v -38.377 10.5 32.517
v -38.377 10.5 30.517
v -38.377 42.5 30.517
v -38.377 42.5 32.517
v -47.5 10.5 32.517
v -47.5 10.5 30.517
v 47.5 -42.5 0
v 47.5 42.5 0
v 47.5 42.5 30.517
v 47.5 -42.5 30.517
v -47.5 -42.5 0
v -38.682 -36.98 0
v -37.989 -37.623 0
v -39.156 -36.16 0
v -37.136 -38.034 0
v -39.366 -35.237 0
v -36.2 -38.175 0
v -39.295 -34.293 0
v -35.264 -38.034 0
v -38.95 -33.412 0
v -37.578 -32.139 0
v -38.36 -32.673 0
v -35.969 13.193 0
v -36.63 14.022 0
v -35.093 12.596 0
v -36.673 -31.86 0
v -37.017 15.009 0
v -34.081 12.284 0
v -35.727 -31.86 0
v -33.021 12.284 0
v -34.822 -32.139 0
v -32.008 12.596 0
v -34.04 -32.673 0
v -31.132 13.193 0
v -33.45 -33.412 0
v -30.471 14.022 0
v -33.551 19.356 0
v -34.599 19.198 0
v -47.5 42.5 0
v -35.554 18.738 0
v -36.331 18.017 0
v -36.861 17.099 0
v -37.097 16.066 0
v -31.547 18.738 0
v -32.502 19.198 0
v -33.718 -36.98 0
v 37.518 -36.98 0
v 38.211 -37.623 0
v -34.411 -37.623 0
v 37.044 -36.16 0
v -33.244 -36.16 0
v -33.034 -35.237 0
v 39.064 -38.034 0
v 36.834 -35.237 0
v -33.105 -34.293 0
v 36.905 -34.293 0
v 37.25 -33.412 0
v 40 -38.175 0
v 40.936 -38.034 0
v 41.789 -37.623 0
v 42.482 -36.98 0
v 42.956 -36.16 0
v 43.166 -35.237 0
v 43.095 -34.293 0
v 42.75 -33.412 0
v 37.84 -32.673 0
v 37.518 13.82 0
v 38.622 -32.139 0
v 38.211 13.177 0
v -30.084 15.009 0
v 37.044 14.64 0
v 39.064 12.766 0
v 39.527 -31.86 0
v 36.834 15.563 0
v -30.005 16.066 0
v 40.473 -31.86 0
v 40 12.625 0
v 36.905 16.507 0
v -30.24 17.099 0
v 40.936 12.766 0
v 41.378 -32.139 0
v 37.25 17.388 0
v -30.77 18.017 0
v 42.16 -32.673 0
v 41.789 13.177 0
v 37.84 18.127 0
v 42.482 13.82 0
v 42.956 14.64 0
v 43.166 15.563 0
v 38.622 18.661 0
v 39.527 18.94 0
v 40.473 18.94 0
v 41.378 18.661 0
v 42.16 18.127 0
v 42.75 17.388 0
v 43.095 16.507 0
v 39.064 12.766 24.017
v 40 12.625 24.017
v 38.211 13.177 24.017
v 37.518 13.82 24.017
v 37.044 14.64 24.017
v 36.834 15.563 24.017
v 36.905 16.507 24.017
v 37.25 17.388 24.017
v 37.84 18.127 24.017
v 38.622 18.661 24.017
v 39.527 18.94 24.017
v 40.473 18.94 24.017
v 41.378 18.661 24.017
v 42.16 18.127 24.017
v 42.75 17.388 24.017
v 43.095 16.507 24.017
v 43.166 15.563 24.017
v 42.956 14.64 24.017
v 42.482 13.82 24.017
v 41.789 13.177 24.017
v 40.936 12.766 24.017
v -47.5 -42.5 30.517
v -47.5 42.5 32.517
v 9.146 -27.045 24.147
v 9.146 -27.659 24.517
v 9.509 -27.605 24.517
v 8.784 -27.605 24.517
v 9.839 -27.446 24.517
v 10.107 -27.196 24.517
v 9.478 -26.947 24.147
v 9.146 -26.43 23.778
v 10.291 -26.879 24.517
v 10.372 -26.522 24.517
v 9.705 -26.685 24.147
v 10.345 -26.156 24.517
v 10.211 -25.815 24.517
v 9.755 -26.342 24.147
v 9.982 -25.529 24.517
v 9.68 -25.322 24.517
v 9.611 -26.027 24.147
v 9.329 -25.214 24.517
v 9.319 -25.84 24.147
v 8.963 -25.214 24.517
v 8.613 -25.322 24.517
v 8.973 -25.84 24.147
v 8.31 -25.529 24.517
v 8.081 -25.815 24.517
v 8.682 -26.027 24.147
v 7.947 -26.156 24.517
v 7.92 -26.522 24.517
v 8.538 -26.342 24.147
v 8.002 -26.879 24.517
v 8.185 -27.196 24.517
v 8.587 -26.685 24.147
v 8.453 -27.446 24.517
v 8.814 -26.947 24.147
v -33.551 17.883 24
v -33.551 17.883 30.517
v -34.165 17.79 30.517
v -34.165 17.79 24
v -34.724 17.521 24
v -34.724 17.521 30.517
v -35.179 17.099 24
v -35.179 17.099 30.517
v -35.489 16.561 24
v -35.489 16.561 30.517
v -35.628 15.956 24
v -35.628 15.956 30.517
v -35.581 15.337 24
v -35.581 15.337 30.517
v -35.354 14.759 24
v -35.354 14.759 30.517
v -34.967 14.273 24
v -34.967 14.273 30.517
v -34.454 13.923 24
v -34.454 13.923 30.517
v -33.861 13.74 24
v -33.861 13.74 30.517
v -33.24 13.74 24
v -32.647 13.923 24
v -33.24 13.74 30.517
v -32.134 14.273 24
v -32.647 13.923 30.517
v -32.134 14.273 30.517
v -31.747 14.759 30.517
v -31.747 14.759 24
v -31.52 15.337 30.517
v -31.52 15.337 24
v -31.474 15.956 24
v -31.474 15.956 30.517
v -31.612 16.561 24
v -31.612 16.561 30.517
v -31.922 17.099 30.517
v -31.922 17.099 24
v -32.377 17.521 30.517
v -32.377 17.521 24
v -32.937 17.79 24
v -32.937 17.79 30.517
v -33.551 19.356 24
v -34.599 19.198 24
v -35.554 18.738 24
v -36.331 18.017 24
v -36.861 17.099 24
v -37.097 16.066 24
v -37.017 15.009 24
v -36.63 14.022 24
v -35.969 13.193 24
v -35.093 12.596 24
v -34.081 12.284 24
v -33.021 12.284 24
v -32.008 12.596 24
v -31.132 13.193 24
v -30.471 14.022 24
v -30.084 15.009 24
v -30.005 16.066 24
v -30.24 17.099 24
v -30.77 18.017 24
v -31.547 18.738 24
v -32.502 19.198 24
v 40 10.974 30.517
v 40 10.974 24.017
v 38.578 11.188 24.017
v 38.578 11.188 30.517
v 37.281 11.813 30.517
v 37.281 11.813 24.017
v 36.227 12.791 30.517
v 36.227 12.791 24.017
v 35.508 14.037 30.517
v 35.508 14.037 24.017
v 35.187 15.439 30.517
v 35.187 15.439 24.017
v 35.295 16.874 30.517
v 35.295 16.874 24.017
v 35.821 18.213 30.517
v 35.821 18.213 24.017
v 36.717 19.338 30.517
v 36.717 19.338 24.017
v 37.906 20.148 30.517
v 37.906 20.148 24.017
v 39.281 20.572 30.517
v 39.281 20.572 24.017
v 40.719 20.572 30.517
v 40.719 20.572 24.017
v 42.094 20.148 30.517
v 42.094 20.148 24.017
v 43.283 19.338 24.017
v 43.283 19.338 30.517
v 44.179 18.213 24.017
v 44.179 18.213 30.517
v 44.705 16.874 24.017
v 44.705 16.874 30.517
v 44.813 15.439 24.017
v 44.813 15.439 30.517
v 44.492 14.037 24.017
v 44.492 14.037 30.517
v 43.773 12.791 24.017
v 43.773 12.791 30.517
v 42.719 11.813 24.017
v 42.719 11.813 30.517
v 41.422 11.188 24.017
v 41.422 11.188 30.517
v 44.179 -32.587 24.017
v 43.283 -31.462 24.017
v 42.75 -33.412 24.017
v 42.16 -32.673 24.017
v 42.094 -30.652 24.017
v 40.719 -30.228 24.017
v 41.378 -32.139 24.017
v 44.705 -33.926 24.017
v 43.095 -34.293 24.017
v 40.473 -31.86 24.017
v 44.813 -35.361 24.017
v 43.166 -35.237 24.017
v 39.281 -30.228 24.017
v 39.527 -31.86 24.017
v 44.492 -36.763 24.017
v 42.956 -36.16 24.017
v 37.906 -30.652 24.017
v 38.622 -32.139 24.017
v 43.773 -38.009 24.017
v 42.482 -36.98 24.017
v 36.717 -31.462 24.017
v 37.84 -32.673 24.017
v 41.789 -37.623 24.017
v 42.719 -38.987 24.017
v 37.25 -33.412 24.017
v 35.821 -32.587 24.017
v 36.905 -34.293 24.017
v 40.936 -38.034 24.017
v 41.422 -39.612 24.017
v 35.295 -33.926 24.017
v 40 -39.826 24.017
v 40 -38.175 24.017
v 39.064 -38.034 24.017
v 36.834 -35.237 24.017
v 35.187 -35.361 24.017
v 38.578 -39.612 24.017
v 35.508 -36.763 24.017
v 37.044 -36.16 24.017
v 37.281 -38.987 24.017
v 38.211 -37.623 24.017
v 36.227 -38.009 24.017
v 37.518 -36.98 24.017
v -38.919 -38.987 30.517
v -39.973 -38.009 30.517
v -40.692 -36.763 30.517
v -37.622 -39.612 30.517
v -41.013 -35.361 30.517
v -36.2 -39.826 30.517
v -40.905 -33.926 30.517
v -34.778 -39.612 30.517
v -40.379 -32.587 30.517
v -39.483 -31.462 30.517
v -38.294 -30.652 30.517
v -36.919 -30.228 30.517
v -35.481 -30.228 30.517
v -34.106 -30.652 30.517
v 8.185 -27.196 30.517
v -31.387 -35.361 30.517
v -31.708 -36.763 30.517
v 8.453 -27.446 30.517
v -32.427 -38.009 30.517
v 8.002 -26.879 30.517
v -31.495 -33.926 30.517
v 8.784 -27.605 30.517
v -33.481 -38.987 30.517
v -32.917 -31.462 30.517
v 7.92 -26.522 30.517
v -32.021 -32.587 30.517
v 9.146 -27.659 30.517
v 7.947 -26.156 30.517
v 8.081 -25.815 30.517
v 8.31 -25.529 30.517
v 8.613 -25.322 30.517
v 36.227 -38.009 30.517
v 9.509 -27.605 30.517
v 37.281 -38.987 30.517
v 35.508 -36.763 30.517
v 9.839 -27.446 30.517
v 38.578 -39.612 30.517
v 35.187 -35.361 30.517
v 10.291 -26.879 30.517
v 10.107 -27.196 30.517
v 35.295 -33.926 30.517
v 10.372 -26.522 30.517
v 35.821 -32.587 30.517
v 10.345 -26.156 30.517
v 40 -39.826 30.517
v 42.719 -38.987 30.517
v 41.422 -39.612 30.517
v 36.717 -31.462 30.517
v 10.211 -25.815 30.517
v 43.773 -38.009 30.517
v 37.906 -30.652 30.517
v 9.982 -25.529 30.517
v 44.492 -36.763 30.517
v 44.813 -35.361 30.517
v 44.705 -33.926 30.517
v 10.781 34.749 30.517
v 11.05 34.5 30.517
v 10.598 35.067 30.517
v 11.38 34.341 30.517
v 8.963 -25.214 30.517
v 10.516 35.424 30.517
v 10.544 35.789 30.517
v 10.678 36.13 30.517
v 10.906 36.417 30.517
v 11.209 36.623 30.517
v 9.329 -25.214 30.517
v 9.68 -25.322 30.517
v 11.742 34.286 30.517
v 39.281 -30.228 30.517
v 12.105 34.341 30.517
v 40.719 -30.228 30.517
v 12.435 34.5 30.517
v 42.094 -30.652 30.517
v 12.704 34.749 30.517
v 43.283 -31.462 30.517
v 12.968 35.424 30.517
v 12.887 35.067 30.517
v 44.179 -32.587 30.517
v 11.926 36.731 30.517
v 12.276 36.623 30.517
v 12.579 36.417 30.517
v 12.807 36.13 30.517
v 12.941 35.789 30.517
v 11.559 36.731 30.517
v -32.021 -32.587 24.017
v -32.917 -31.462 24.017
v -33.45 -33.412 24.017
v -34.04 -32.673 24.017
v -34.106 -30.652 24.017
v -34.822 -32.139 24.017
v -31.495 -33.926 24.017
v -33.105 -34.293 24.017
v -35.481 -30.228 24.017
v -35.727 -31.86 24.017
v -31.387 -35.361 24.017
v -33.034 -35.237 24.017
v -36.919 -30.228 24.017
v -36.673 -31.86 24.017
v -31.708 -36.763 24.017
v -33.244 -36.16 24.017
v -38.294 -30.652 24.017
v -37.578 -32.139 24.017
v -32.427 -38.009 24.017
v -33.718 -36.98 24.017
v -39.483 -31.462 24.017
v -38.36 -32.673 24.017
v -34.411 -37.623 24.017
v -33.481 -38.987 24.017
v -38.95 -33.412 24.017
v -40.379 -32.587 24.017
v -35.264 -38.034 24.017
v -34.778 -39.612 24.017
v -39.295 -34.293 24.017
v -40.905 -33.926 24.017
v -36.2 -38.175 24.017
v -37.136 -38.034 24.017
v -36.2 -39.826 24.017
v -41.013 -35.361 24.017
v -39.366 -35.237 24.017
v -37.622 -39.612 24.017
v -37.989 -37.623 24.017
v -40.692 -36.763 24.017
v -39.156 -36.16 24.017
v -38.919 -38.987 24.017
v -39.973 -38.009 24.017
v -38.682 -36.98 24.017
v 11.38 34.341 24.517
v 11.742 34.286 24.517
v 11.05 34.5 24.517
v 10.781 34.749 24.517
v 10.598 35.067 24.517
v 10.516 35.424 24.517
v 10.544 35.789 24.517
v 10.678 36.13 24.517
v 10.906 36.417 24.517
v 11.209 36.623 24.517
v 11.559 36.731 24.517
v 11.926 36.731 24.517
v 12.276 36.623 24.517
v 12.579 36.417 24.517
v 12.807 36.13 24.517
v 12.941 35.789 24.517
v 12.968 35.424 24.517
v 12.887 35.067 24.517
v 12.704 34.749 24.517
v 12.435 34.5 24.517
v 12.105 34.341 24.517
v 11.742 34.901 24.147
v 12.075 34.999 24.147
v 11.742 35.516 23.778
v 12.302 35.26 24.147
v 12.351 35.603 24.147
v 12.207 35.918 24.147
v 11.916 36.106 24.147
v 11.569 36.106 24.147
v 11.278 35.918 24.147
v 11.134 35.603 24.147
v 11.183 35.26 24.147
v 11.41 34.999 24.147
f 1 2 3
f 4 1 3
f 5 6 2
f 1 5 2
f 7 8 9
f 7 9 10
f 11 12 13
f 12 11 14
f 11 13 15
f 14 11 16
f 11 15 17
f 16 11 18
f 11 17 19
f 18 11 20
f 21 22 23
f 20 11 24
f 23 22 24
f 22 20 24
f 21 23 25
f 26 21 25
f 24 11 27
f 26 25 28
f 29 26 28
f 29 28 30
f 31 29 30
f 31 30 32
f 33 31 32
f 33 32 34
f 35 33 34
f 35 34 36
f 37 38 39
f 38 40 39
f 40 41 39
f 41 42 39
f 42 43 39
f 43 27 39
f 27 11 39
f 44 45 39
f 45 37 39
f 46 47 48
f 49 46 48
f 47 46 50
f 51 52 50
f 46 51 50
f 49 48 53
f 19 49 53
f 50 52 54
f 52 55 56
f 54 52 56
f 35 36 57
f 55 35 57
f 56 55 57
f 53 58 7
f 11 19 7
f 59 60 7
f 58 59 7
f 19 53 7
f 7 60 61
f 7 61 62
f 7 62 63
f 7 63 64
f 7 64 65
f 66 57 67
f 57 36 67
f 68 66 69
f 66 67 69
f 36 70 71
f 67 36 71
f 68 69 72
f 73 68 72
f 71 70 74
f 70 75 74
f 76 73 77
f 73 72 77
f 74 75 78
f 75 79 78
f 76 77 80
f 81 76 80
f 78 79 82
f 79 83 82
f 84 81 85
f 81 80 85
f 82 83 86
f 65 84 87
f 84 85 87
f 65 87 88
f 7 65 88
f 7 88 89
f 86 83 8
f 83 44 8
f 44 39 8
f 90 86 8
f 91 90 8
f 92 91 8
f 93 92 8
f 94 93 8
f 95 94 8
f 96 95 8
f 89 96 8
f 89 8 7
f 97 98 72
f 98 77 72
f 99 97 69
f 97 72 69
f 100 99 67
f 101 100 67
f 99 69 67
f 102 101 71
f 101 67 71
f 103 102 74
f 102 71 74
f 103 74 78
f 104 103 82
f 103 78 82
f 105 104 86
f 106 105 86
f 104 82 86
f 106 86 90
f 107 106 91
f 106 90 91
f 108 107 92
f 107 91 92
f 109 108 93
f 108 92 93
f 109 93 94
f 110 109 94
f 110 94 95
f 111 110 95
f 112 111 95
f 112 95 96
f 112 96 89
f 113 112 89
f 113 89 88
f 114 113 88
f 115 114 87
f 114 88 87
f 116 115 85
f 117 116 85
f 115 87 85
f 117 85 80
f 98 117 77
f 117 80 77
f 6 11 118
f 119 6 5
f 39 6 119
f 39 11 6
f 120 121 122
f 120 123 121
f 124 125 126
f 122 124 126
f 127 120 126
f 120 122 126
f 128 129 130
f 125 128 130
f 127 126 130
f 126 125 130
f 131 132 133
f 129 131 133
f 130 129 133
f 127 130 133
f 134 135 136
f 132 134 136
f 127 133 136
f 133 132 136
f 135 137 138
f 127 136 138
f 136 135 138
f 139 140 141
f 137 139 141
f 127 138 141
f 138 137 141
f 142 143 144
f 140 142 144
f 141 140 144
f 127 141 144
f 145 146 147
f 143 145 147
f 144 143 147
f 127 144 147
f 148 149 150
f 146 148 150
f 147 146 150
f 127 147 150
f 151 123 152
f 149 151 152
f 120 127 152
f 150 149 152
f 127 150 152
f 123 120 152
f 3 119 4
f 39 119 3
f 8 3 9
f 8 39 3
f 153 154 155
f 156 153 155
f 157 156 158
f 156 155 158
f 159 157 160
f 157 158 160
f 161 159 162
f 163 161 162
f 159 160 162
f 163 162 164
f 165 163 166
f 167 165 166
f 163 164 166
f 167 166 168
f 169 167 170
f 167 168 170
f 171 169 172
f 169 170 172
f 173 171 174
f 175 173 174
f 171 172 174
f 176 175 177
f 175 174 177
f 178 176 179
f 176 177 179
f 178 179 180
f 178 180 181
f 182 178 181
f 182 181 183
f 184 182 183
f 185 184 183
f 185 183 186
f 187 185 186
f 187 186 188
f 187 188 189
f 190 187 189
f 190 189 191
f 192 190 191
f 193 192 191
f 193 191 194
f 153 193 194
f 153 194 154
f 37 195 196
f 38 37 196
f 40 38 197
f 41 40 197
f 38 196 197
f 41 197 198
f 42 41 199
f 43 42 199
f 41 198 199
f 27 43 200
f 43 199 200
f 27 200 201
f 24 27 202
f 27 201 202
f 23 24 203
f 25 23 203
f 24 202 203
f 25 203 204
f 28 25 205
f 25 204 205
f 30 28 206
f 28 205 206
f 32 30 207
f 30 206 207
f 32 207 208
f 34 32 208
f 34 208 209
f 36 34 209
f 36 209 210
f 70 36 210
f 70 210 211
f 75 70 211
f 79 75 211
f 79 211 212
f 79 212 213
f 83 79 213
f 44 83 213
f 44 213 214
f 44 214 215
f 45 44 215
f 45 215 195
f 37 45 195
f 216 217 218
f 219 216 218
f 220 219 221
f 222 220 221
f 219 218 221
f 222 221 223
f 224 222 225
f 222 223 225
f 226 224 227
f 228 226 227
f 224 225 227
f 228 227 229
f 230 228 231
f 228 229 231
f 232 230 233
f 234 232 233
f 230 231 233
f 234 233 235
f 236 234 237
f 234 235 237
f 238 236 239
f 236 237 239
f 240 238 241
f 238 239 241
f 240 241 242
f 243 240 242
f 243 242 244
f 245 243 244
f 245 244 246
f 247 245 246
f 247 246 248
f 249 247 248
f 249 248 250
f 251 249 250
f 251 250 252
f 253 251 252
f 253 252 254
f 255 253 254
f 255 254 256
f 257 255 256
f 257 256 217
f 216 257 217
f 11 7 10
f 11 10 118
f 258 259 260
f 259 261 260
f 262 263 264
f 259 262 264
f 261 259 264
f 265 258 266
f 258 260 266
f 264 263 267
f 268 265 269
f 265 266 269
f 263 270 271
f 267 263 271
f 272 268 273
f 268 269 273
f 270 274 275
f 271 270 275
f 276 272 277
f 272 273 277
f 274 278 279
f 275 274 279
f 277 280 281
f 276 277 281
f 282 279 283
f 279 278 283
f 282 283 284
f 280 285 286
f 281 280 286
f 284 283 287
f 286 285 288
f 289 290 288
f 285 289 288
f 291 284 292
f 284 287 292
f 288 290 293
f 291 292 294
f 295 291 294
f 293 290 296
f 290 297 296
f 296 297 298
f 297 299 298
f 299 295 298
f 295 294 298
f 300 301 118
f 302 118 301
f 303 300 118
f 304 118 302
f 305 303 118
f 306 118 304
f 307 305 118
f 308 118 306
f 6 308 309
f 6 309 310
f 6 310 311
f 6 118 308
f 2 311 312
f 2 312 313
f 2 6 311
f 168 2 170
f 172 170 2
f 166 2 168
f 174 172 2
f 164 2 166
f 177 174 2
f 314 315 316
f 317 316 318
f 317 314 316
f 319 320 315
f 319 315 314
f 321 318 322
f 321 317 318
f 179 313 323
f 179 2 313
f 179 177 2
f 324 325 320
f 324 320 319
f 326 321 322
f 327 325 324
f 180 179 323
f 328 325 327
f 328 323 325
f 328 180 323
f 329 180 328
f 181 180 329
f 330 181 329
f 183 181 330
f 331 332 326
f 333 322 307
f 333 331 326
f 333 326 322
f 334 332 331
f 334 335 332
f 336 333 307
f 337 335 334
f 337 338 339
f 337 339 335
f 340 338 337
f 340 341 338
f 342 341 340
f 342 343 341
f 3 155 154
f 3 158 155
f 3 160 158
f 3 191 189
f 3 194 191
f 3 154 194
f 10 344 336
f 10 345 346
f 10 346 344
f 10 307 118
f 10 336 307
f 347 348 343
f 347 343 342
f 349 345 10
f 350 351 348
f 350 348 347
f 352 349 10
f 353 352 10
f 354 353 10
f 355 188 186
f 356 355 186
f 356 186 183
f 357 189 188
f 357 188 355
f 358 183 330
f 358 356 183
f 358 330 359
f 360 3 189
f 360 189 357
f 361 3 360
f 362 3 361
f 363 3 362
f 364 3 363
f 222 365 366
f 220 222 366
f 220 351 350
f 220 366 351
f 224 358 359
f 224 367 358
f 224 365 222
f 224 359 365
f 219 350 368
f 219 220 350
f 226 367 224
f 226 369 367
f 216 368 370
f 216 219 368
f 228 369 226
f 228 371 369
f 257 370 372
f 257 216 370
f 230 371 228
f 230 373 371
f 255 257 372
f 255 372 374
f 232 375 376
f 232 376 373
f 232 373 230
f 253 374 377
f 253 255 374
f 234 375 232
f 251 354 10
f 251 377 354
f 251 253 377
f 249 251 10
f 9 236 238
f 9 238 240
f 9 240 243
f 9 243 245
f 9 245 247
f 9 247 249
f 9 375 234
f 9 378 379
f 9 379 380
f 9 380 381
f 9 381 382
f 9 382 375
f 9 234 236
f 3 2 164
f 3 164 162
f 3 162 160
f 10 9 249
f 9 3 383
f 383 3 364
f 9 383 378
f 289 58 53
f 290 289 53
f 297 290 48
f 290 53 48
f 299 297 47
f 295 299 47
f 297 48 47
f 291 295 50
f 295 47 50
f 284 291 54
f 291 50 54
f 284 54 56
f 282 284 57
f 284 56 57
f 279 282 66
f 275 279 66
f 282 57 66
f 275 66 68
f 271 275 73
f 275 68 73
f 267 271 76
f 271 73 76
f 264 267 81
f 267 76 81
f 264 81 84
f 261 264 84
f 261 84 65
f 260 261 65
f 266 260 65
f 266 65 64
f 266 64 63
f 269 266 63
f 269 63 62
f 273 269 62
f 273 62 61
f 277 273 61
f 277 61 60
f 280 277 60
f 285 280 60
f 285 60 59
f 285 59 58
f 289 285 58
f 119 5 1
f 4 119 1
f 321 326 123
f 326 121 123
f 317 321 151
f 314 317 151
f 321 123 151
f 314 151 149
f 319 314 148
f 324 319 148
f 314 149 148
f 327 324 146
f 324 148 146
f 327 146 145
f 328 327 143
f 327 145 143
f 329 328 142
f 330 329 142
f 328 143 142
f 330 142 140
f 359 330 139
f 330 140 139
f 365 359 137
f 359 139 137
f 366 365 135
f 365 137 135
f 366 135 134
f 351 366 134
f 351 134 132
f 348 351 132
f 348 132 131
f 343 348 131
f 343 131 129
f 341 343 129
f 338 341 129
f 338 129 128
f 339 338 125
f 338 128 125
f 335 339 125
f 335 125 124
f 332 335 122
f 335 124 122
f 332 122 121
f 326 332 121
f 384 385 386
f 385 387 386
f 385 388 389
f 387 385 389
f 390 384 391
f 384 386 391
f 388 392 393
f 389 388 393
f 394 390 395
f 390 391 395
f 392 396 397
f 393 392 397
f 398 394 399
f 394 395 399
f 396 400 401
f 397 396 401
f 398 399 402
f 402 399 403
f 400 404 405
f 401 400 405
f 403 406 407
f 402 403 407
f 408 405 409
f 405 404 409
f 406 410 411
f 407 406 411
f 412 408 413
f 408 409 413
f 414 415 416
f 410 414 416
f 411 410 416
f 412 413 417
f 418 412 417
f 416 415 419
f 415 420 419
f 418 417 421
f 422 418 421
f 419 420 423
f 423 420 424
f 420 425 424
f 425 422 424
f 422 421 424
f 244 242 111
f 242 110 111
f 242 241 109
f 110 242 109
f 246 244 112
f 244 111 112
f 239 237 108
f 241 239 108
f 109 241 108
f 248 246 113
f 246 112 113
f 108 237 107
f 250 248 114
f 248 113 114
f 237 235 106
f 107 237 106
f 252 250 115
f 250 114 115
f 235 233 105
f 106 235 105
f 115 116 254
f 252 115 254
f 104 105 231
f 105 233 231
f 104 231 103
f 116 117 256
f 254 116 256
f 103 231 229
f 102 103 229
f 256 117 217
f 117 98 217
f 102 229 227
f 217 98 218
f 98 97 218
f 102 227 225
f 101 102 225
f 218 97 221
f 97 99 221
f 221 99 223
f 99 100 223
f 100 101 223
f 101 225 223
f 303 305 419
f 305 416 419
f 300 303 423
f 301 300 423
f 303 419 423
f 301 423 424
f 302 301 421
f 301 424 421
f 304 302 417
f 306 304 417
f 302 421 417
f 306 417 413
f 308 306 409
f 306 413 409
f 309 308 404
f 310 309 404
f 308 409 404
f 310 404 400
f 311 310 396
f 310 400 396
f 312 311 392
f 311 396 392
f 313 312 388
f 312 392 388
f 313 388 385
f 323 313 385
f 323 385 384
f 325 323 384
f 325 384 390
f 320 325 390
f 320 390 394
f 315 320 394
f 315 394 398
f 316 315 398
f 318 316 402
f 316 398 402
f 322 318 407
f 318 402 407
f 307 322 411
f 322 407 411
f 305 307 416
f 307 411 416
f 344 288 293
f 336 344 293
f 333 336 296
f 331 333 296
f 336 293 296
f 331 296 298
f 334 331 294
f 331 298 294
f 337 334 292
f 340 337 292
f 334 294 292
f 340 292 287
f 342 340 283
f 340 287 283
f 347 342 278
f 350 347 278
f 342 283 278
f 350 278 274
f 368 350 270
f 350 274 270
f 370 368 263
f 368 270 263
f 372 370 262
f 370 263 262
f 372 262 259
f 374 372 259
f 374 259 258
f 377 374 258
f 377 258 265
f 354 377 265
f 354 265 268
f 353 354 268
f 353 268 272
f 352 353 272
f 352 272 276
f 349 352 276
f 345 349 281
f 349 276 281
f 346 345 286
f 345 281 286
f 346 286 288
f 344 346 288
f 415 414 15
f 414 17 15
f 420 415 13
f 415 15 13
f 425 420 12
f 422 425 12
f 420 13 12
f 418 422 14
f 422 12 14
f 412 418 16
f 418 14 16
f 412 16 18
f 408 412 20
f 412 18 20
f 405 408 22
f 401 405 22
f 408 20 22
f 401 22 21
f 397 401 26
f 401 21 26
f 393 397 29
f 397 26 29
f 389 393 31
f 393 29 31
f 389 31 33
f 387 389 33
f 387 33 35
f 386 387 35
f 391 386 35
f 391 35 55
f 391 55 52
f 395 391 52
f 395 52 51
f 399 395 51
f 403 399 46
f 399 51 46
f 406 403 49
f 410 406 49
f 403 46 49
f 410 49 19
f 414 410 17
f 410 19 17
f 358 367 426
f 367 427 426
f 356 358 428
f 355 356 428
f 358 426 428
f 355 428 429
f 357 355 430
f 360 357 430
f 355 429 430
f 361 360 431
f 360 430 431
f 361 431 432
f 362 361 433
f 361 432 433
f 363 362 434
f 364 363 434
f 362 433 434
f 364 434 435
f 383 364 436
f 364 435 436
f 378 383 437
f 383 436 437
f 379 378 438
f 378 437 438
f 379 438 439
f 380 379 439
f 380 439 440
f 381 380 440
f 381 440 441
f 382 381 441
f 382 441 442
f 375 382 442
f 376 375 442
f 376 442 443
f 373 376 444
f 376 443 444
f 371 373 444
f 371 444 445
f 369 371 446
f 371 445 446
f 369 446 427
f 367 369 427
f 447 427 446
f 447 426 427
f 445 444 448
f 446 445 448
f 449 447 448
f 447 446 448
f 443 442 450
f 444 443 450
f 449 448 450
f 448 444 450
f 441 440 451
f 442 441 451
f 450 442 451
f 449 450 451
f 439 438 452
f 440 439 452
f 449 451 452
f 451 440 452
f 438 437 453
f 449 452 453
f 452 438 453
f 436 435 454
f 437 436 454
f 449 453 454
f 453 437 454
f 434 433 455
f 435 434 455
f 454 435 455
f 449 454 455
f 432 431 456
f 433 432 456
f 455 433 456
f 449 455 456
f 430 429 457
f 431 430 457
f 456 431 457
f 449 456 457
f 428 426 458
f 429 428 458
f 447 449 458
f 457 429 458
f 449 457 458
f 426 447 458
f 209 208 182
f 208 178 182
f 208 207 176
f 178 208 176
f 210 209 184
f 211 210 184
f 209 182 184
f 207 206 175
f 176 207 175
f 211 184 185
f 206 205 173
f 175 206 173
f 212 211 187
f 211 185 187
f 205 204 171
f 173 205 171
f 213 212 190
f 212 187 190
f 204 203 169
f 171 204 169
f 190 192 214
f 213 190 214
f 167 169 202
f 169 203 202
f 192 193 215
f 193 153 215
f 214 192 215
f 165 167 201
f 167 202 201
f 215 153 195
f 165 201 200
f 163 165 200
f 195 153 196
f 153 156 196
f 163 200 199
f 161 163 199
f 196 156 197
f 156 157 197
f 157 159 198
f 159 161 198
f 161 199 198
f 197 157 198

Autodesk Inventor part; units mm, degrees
ref_plane "YZ Plane" through (0, 0, 0) normal (1, 0, 0) x (0, 1, 0)
ref_plane "XZ Plane" through (0, 0, 0) normal (0, 1, 0) x (-1, 0, 0)
ref_plane "XY Plane" through (0, 0, 0) normal (0, 0, 1) x (1, 0, 0)
sketch "Sketch1" plane through (0, 0, 0) normal (0, 0, 1) x (1, 0, 0)
  line L0 (-47.5, 42.5) -> (47.5, 42.5)
  line L1 (47.5, 42.5) -> (47.5, -42.5)
  line L2 (47.5, -42.5) -> (-47.5, -42.5)
  line L3 (-47.5, -42.5) -> (-47.5, 42.5)
  point P0 (0, 0)
  dimension "d0" = 95
  dimension "d1" = 85
  dimension "d2" = 47.5
  dimension "d3" = 42.5
extrude "Extrusion1" add sketch "Sketch1" along normal blind 30.5168
sketch "Sketch2" plane through (0, 0, 30.5168) normal (0, 0, 1) x (1, 0, 0)
  arc A0 (-201.3, -568.6) -> (-188.8, -581.1) centre (-188.8, -568.6) ccw projected
  line L0 (-188.8, -581.1) -> (243.4, -581.1) projected
  arc A1 (243.4, -581.1) -> (255.9, -568.6) centre (243.4, -568.6) ccw projected
  line L1 (255.9, -568.6) -> (255.9, 16) projected
  arc A2 (255.9, 16) -> (243.4, 28.5) centre (243.4, 16) ccw projected
  line L2 (243.4, 28.5) -> (-188.8, 28.5) projected
  arc A3 (-188.8, 28.5) -> (-201.3, 16) centre (-188.8, 16) ccw projected
  line L3 (-201.3, 16) -> (-201.3, -568.6) projected
  circle A4 centre (217.8, -568.4) radius 2.5527 projected
  circle A5 centre (192.4, -568.4) radius 2.5527 projected
  circle A6 centre (167, -568.4) radius 2.5527 projected
  circle A7 centre (141.6, -568.4) radius 2.5527 projected
  circle A8 centre (116.2, -568.4) radius 2.5527 projected
  circle A9 centre (90.8, -568.4) radius 2.5527 projected
  circle A10 centre (65.4, -568.4) radius 2.5527 projected
  circle A11 centre (40, -568.4) radius 2.5527 projected
  circle A12 centre (14.6, -568.4) radius 2.5527 projected
  circle A13 centre (-10.8, -568.4) radius 2.5527 projected
  circle A14 centre (-36.2, -568.4) radius 2.5527 projected
  circle A15 centre (-61.6, -568.4) radius 2.5527 projected
  circle A16 centre (-87, -568.4) radius 2.5527 projected
  circle A17 centre (-112.4, -568.4) radius 2.5527 projected
  circle A18 centre (-137.8, -568.4) radius 2.5527 projected
  circle A19 centre (-163.2, -568.4) radius 2.5527 projected
  circle A20 centre (-188.6, -568.4) radius 2.5527 projected
  circle A21 centre (243.2, -543) radius 2.5527 projected
  circle A22 centre (217.8, -543) radius 2.5527 projected
  circle A23 centre (192.4, -543) radius 2.5527 projected
  circle A24 centre (167, -543) radius 2.5527 projected
  circle A25 centre (141.6, -543) radius 2.5527 projected
  circle A26 centre (116.2, -543) radius 2.5527 projected
  circle A27 centre (90.8, -543) radius 2.5527 projected
  circle A28 centre (65.4, -543) radius 2.5527 projected
  circle A29 centre (40, -543) radius 2.5527 projected
  circle A30 centre (14.6, -543) radius 2.5527 projected
  circle A31 centre (-10.8, -543) radius 2.5527 projected
  circle A32 centre (-36.2, -543) radius 2.5527 projected
  circle A33 centre (-61.6, -543) radius 2.5527 projected
  circle A34 centre (-87, -543) radius 2.5527 projected
  circle A35 centre (-112.4, -543) radius 2.5527 projected
  circle A36 centre (-137.8, -543) radius 2.5527 projected
  circle A37 centre (-163.2, -543) radius 2.5527 projected
  circle A38 centre (-188.6, -543) radius 2.5527 projected
  circle A39 centre (243.2, -517.6) radius 2.5527 projected
  circle A40 centre (217.8, -517.6) radius 2.5527 projected
  circle A41 centre (192.4, -517.6) radius 2.5527 projected
  circle A42 centre (167, -517.6) radius 2.5527 projected
  circle A43 centre (141.6, -517.6) radius 2.5527 projected
  circle A44 centre (116.2, -517.6) radius 2.5527 projected
  circle A45 centre (90.8, -517.6) radius 2.5527 projected
  circle A46 centre (65.4, -517.6) radius 2.5527 projected
  circle A47 centre (40, -517.6) radius 2.5527 projected
  circle A48 centre (14.6, -517.6) radius 2.5527 projected
  circle A49 centre (-10.8, -517.6) radius 2.5527 projected
  circle A50 centre (-36.2, -517.6) radius 2.5527 projected
  circle A51 centre (-61.6, -517.6) radius 2.5527 projected
  circle A52 centre (-87, -517.6) radius 2.5527 projected
  circle A53 centre (-112.4, -517.6) radius 2.5527 projected
  circle A54 centre (-137.8, -517.6) radius 2.5527 projected
  circle A55 centre (-163.2, -517.6) radius 2.5527 projected
  circle A56 centre (-188.6, -517.6) radius 2.5527 projected
  circle A57 centre (243.2, -492.2) radius 2.5527 projected
  circle A58 centre (217.8, -492.2) radius 2.5527 projected
  circle A59 centre (192.4, -492.2) radius 2.5527 projected
  circle A60 centre (167, -492.2) radius 2.5527 projected
  circle A61 centre (141.6, -492.2) radius 2.5527 projected
  circle A62 centre (116.2, -492.2) radius 2.5527 projected
  circle A63 centre (90.8, -492.2) radius 2.5527 projected
  circle A64 centre (65.4, -492.2) radius 2.5527 projected
  circle A65 centre (40, -492.2) radius 2.5527 projected
  circle A66 centre (14.6, -492.2) radius 2.5527 projected
  circle A67 centre (-10.8, -492.2) radius 2.5527 projected
  circle A68 centre (-36.2, -492.2) radius 2.5527 projected
  circle A69 centre (-61.6, -492.2) radius 2.5527 projected
  circle A70 centre (-87, -492.2) radius 2.5527 projected
  circle A71 centre (-112.4, -492.2) radius 2.5527 projected
  circle A72 centre (-137.8, -492.2) radius 2.5527 projected
  circle A73 centre (-163.2, -492.2) radius 2.5527 projected
  circle A74 centre (-188.6, -492.2) radius 2.5527 projected
  circle A75 centre (243.2, -466.8) radius 2.5527 projected
  circle A76 centre (217.8, -466.8) radius 2.5527 projected
  circle A77 centre (192.4, -466.8) radius 2.5527 projected
  circle A78 centre (167, -466.8) radius 2.5527 projected
  circle A79 centre (141.6, -466.8) radius 2.5527 projected
  circle A80 centre (116.2, -466.8) radius 2.5527 projected
  circle A81 centre (90.8, -466.8) radius 2.5527 projected
  circle A82 centre (65.4, -466.8) radius 2.5527 projected
  circle A83 centre (40, -466.8) radius 2.5527 projected
  circle A84 centre (14.6, -466.8) radius 2.5527 projected
  circle A85 centre (-10.8, -466.8) radius 2.5527 projected
  circle A86 centre (-36.2, -466.8) radius 2.5527 projected
  circle A87 centre (-61.6, -466.8) radius 2.5527 projected
  circle A88 centre (-87, -466.8) radius 2.5527 projected
  circle A89 centre (-112.4, -466.8) radius 2.5527 projected
  circle A90 centre (-137.8, -466.8) radius 2.5527 projected
  circle A91 centre (-163.2, -466.8) radius 2.5527 projected
  circle A92 centre (-188.6, -466.8) radius 2.5527 projected
  circle A93 centre (243.2, -441.4) radius 2.5527 projected
  circle A94 centre (217.8, -441.4) radius 2.5527 projected
  circle A95 centre (192.4, -441.4) radius 2.5527 projected
  circle A96 centre (167, -441.4) radius 2.5527 projected
  circle A97 centre (141.6, -441.4) radius 2.5527 projected
  circle A98 centre (116.2, -441.4) radius 2.5527 projected
  circle A99 centre (90.8, -441.4) radius 2.5527 projected
  circle A100 centre (65.4, -441.4) radius 2.5527 projected
  circle A101 centre (40, -441.4) radius 2.5527 projected
  circle A102 centre (14.6, -441.4) radius 2.5527 projected
  circle A103 centre (-10.8, -441.4) radius 2.5527 projected
  circle A104 centre (-36.2, -441.4) radius 2.5527 projected
  circle A105 centre (-61.6, -441.4) radius 2.5527 projected
  circle A106 centre (-87, -441.4) radius 2.5527 projected
  circle A107 centre (-112.4, -441.4) radius 2.5527 projected
  circle A108 centre (-137.8, -441.4) radius 2.5527 projected
  circle A109 centre (-163.2, -441.4) radius 2.5527 projected
  circle A110 centre (-188.6, -441.4) radius 2.5527 projected
  circle A111 centre (243.2, -416) radius 2.5527 projected
  circle A112 centre (217.8, -416) radius 2.5527 projected
  circle A113 centre (192.4, -416) radius 2.5527 projected
  circle A114 centre (167, -416) radius 2.5527 projected
  circle A115 centre (141.6, -416) radius 2.5527 projected
  circle A116 centre (116.2, -416) radius 2.5527 projected
  circle A117 centre (90.8, -416) radius 2.5527 projected
  circle A118 centre (65.4, -416) radius 2.5527 projected
  circle A119 centre (40, -416) radius 2.5527 projected
  circle A120 centre (14.6, -416) radius 2.5527 projected
  circle A121 centre (-10.8, -416) radius 2.5527 projected
  circle A122 centre (-36.2, -416) radius 2.5527 projected
  circle A123 centre (-61.6, -416) radius 2.5527 projected
  circle A124 centre (-87, -416) radius 2.5527 projected
  circle A125 centre (-112.4, -416) radius 2.5527 projected
  circle A126 centre (-137.8, -416) radius 2.5527 projected
  circle A127 centre (-163.2, -416) radius 2.5527 projected
  circle A128 centre (-188.6, -416) radius 2.5527 projected
  circle A129 centre (243.2, -390.6) radius 2.5527 projected
  circle A130 centre (217.8, -390.6) radius 2.5527 projected
  circle A131 centre (192.4, -390.6) radius 2.5527 projected
  circle A132 centre (167, -390.6) radius 2.5527 projected
  circle A133 centre (141.6, -390.6) radius 2.5527 projected
  circle A134 centre (116.2, -390.6) radius 2.5527 projected
  circle A135 centre (90.8, -390.6) radius 2.5527 projected
  circle A136 centre (65.4, -390.6) radius 2.5527 projected
  circle A137 centre (40, -390.6) radius 2.5527 projected
  circle A138 centre (14.6, -390.6) radius 2.5527 projected
  circle A139 centre (-10.8, -390.6) radius 2.5527 projected
  circle A140 centre (-36.2, -390.6) radius 2.5527 projected
  circle A141 centre (-61.6, -390.6) radius 2.5527 projected
  circle A142 centre (-87, -390.6) radius 2.5527 projected
  circle A143 centre (-112.4, -390.6) radius 2.5527 projected
  circle A144 centre (-137.8, -390.6) radius 2.5527 projected
  circle A145 centre (-163.2, -390.6) radius 2.5527 projected
  circle A146 centre (-188.6, -390.6) radius 2.5527 projected
  circle A147 centre (243.2, -365.2) radius 2.5527 projected
  circle A148 centre (217.8, -365.2) radius 2.5527 projected
  circle A149 centre (192.4, -365.2) radius 2.5527 projected
  circle A150 centre (167, -365.2) radius 2.5527 projected
  circle A151 centre (141.6, -365.2) radius 2.5527 projected
  circle A152 centre (116.2, -365.2) radius 2.5527 projected
  circle A153 centre (90.8, -365.2) radius 2.5527 projected
  circle A154 centre (65.4, -365.2) radius 2.5527 projected
  circle A155 centre (40, -365.2) radius 2.5527 projected
  circle A156 centre (14.6, -365.2) radius 2.5527 projected
  circle A157 centre (-10.8, -365.2) radius 2.5527 projected
  circle A158 centre (-36.2, -365.2) radius 2.5527 projected
  circle A159 centre (-61.6, -365.2) radius 2.5527 projected
  circle A160 centre (-87, -365.2) radius 2.5527 projected
  circle A161 centre (-112.4, -365.2) radius 2.5527 projected
  circle A162 centre (-137.8, -365.2) radius 2.5527 projected
  circle A163 centre (-163.2, -365.2) radius 2.5527 projected
  circle A164 centre (-188.6, -365.2) radius 2.5527 projected
  circle A165 centre (243.2, -339.8) radius 2.5527 projected
  circle A166 centre (217.8, -339.8) radius 2.5527 projected
  circle A167 centre (192.4, -339.8) radius 2.5527 projected
  circle A168 centre (167, -339.8) radius 2.5527 projected
  circle A169 centre (141.6, -339.8) radius 2.5527 projected
  circle A170 centre (116.2, -339.8) radius 2.5527 projected
  circle A171 centre (90.8, -339.8) radius 2.5527 projected
  circle A172 centre (65.4, -339.8) radius 2.5527 projected
  circle A173 centre (40, -339.8) radius 2.5527 projected
  circle A174 centre (14.6, -339.8) radius 2.5527 projected
  circle A175 centre (-10.8, -339.8) radius 2.5527 projected
  circle A176 centre (-36.2, -339.8) radius 2.5527 projected
  circle A177 centre (-61.6, -339.8) radius 2.5527 projected
  circle A178 centre (-87, -339.8) radius 2.5527 projected
  circle A179 centre (-112.4, -339.8) radius 2.5527 projected
  circle A180 centre (-137.8, -339.8) radius 2.5527 projected
  circle A181 centre (-163.2, -339.8) radius 2.5527 projected
  circle A182 centre (-188.6, -339.8) radius 2.5527 projected
  circle A183 centre (243.2, -314.4) radius 2.5527 projected
  circle A184 centre (217.8, -314.4) radius 2.5527 projected
  circle A185 centre (192.4, -314.4) radius 2.5527 projected
  circle A186 centre (167, -314.4) radius 2.5527 projected
  circle A187 centre (141.6, -314.4) radius 2.5527 projected
  circle A188 centre (116.2, -314.4) radius 2.5527 projected
  circle A189 centre (90.8, -314.4) radius 2.5527 projected
  circle A190 centre (65.4, -314.4) radius 2.5527 projected
  circle A191 centre (40, -314.4) radius 2.5527 projected
  circle A192 centre (14.6, -314.4) radius 2.5527 projected
  circle A193 centre (-10.8, -314.4) radius 2.5527 projected
  circle A194 centre (-36.2, -314.4) radius 2.5527 projected
  circle A195 centre (-61.6, -314.4) radius 2.5527 projected
  circle A196 centre (-87, -314.4) radius 2.5527 projected
  circle A197 centre (-112.4, -314.4) radius 2.5527 projected
  circle A198 centre (-137.8, -314.4) radius 2.5527 projected
  circle A199 centre (-163.2, -314.4) radius 2.5527 projected
  circle A200 centre (-188.6, -314.4) radius 2.5527 projected
  circle A201 centre (243.2, -289) radius 2.5527 projected
  circle A202 centre (217.8, -289) radius 2.5527 projected
  circle A203 centre (192.4, -289) radius 2.5527 projected
  circle A204 centre (167, -289) radius 2.5527 projected
  circle A205 centre (141.6, -289) radius 2.5527 projected
  circle A206 centre (116.2, -289) radius 2.5527 projected
  circle A207 centre (90.8, -289) radius 2.5527 projected
  circle A208 centre (65.4, -289) radius 2.5527 projected
  circle A209 centre (40, -289) radius 2.5527 projected
  circle A210 centre (14.6, -289) radius 2.5527 projected
  circle A211 centre (-10.8, -289) radius 2.5527 projected
  circle A212 centre (-36.2, -289) radius 2.5527 projected
  circle A213 centre (-61.6, -289) radius 2.5527 projected
  circle A214 centre (-87, -289) radius 2.5527 projected
  circle A215 centre (-112.4, -289) radius 2.5527 projected
  circle A216 centre (-137.8, -289) radius 2.5527 projected
  circle A217 centre (-163.2, -289) radius 2.5527 projected
  circle A218 centre (-188.6, -289) radius 2.5527 projected
  circle A219 centre (243.2, -263.6) radius 2.5527 projected
  circle A220 centre (217.8, -263.6) radius 2.5527 projected
  circle A221 centre (192.4, -263.6) radius 2.5527 projected
  circle A222 centre (167, -263.6) radius 2.5527 projected
  circle A223 centre (141.6, -263.6) radius 2.5527 projected
  circle A224 centre (116.2, -263.6) radius 2.5527 projected
  circle A225 centre (90.8, -263.6) radius 2.5527 projected
  circle A226 centre (65.4, -263.6) radius 2.5527 projected
  circle A227 centre (40, -263.6) radius 2.5527 projected
  circle A228 centre (14.6, -263.6) radius 2.5527 projected
  circle A229 centre (-10.8, -263.6) radius 2.5527 projected
  circle A230 centre (-36.2, -263.6) radius 2.5527 projected
  circle A231 centre (-61.6, -263.6) radius 2.5527 projected
  circle A232 centre (-87, -263.6) radius 2.5527 projected
  circle A233 centre (-112.4, -263.6) radius 2.5527 projected
  circle A234 centre (-137.8, -263.6) radius 2.5527 projected
  circle A235 centre (-163.2, -263.6) radius 2.5527 projected
  circle A236 centre (-188.6, -263.6) radius 2.5527 projected
  circle A237 centre (243.2, -238.2) radius 2.5527 projected
  circle A238 centre (217.8, -238.2) radius 2.5527 projected
  circle A239 centre (192.4, -238.2) radius 2.5527 projected
  circle A240 centre (167, -238.2) radius 2.5527 projected
  circle A241 centre (141.6, -238.2) radius 2.5527 projected
  circle A242 centre (116.2, -238.2) radius 2.5527 projected
  circle A243 centre (90.8, -238.2) radius 2.5527 projected
  circle A244 centre (65.4, -238.2) radius 2.5527 projected
  circle A245 centre (40, -238.2) radius 2.5527 projected
  circle A246 centre (14.6, -238.2) radius 2.5527 projected
  circle A247 centre (-10.8, -238.2) radius 2.5527 projected
  circle A248 centre (-36.2, -238.2) radius 2.5527 projected
  circle A249 centre (-61.6, -238.2) radius 2.5527 projected
  circle A250 centre (-87, -238.2) radius 2.5527 projected
  circle A251 centre (-112.4, -238.2) radius 2.5527 projected
  circle A252 centre (-137.8, -238.2) radius 2.5527 projected
  circle A253 centre (-163.2, -238.2) radius 2.5527 projected
  circle A254 centre (-188.6, -238.2) radius 2.5527 projected
  circle A255 centre (243.2, -212.8) radius 2.5527 projected
  circle A256 centre (217.8, -212.8) radius 2.5527 projected
  circle A257 centre (192.4, -212.8) radius 2.5527 projected
  circle A258 centre (167, -212.8) radius 2.5527 projected
  circle A259 centre (141.6, -212.8) radius 2.5527 projected
  circle A260 centre (116.2, -212.8) radius 2.5527 projected
  circle A261 centre (90.8, -212.8) radius 2.5527 projected
  circle A262 centre (65.4, -212.8) radius 2.5527 projected
  circle A263 centre (40, -212.8) radius 2.5527 projected
  circle A264 centre (14.6, -212.8) radius 2.5527 projected
  circle A265 centre (-10.8, -212.8) radius 2.5527 projected
  circle A266 centre (-36.2, -212.8) radius 2.5527 projected
  circle A267 centre (-61.6, -212.8) radius 2.5527 projected
  circle A268 centre (-87, -212.8) radius 2.5527 projected
  circle A269 centre (-112.4, -212.8) radius 2.5527 projected
  circle A270 centre (-137.8, -212.8) radius 2.5527 projected
  circle A271 centre (-163.2, -212.8) radius 2.5527 projected
  circle A272 centre (-188.6, -212.8) radius 2.5527 projected
  circle A273 centre (243.2, -187.4) radius 2.5527 projected
  circle A274 centre (217.8, -187.4) radius 2.5527 projected
  circle A275 centre (192.4, -187.4) radius 2.5527 projected
  circle A276 centre (167, -187.4) radius 2.5527 projected
  circle A277 centre (141.6, -187.4) radius 2.5527 projected
  circle A278 centre (116.2, -187.4) radius 2.5527 projected
  circle A279 centre (90.8, -187.4) radius 2.5527 projected
  circle A280 centre (65.4, -187.4) radius 2.5527 projected
  circle A281 centre (40, -187.4) radius 2.5527 projected
  circle A282 centre (14.6, -187.4) radius 2.5527 projected
  circle A283 centre (-10.8, -187.4) radius 2.5527 projected
  circle A284 centre (-36.2, -187.4) radius 2.5527 projected
  circle A285 centre (-61.6, -187.4) radius 2.5527 projected
  circle A286 centre (-87, -187.4) radius 2.5527 projected
  circle A287 centre (-112.4, -187.4) radius 2.5527 projected
  circle A288 centre (-137.8, -187.4) radius 2.5527 projected
  circle A289 centre (-163.2, -187.4) radius 2.5527 projected
  circle A290 centre (-188.6, -187.4) radius 2.5527 projected
  circle A291 centre (243.2, -162) radius 2.5527 projected
  circle A292 centre (217.8, -162) radius 2.5527 projected
  circle A293 centre (192.4, -162) radius 2.5527 projected
  circle A294 centre (167, -162) radius 2.5527 projected
  circle A295 centre (141.6, -162) radius 2.5527 projected
  circle A296 centre (116.2, -162) radius 2.5527 projected
  circle A297 centre (90.8, -162) radius 2.5527 projected
  circle A298 centre (65.4, -162) radius 2.5527 projected
  circle A299 centre (40, -162) radius 2.5527 projected
  circle A300 centre (14.6, -162) radius 2.5527 projected
  circle A301 centre (-10.8, -162) radius 2.5527 projected
  circle A302 centre (-36.2, -162) radius 2.5527 projected
  circle A303 centre (-61.6, -162) radius 2.5527 projected
  circle A304 centre (-87, -162) radius 2.5527 projected
  circle A305 centre (-112.4, -162) radius 2.5527 projected
  circle A306 centre (-137.8, -162) radius 2.5527 projected
  circle A307 centre (-163.2, -162) radius 2.5527 projected
  circle A308 centre (-188.6, -162) radius 2.5527 projected
  circle A309 centre (243.2, -136.6) radius 2.5527 projected
  circle A310 centre (217.8, -136.6) radius 2.5527 projected
  circle A311 centre (192.4, -136.6) radius 2.5527 projected
  circle A312 centre (167, -136.6) radius 2.5527 projected
  circle A313 centre (141.6, -136.6) radius 2.5527 projected
  circle A314 centre (116.2, -136.6) radius 2.5527 projected
  circle A315 centre (90.8, -136.6) radius 2.5527 projected
  circle A316 centre (65.4, -136.6) radius 2.5527 projected
  circle A317 centre (40, -136.6) radius 2.5527 projected
  circle A318 centre (14.6, -136.6) radius 2.5527 projected
  circle A319 centre (-10.8, -136.6) radius 2.5527 projected
  circle A320 centre (-36.2, -136.6) radius 2.5527 projected
  circle A321 centre (-61.6, -136.6) radius 2.5527 projected
  circle A322 centre (-87, -136.6) radius 2.5527 projected
  circle A323 centre (-112.4, -136.6) radius 2.5527 projected
  circle A324 centre (-137.8, -136.6) radius 2.5527 projected
  circle A325 centre (-163.2, -136.6) radius 2.5527 projected
  circle A326 centre (-188.6, -136.6) radius 2.5527 projected
  circle A327 centre (243.2, -111.2) radius 2.5527 projected
  circle A328 centre (217.8, -111.2) radius 2.5527 projected
  circle A329 centre (192.4, -111.2) radius 2.5527 projected
  circle A330 centre (167, -111.2) radius 2.5527 projected
  circle A331 centre (141.6, -111.2) radius 2.5527 projected
  circle A332 centre (116.2, -111.2) radius 2.5527 projected
  circle A333 centre (90.8, -111.2) radius 2.5527 projected
  circle A334 centre (65.4, -111.2) radius 2.5527 projected
  circle A335 centre (40, -111.2) radius 2.5527 projected
  circle A336 centre (14.6, -111.2) radius 2.5527 projected
  circle A337 centre (-10.8, -111.2) radius 2.5527 projected
  circle A338 centre (-36.2, -111.2) radius 2.5527 projected
  circle A339 centre (-61.6, -111.2) radius 2.5527 projected
  circle A340 centre (-87, -111.2) radius 2.5527 projected
  circle A341 centre (-112.4, -111.2) radius 2.5527 projected
  circle A342 centre (-137.8, -111.2) radius 2.5527 projected
  circle A343 centre (-163.2, -111.2) radius 2.5527 projected
  circle A344 centre (-188.6, -111.2) radius 2.5527 projected
  circle A345 centre (243.2, -85.8) radius 2.5527 projected
  circle A346 centre (217.8, -85.8) radius 2.5527 projected
  circle A347 centre (192.4, -85.8) radius 2.5527 projected
  circle A348 centre (167, -85.8) radius 2.5527 projected
  circle A349 centre (141.6, -85.8) radius 2.5527 projected
  circle A350 centre (116.2, -85.8) radius 2.5527 projected
  circle A351 centre (90.8, -85.8) radius 2.5527 projected
  circle A352 centre (65.4, -85.8) radius 2.5527 projected
  circle A353 centre (40, -85.8) radius 2.5527 projected
  circle A354 centre (14.6, -85.8) radius 2.5527 projected
  circle A355 centre (-10.8, -85.8) radius 2.5527 projected
  circle A356 centre (-36.2, -85.8) radius 2.5527 projected
  circle A357 centre (-61.6, -85.8) radius 2.5527 projected
  circle A358 centre (-87, -85.8) radius 2.5527 projected
  circle A359 centre (-112.4, -85.8) radius 2.5527 projected
  circle A360 centre (-137.8, -85.8) radius 2.5527 projected
  circle A361 centre (-163.2, -85.8) radius 2.5527 projected
  circle A362 centre (-188.6, -85.8) radius 2.5527 projected
  circle A363 centre (243.2, -60.4) radius 2.5527 projected
  circle A364 centre (217.8, -60.4) radius 2.5527 projected
  circle A365 centre (192.4, -60.4) radius 2.5527 projected
  circle A366 centre (167, -60.4) radius 2.5527 projected
  circle A367 centre (141.6, -60.4) radius 2.5527 projected
  circle A368 centre (116.2, -60.4) radius 2.5527 projected
  circle A369 centre (90.8, -60.4) radius 2.5527 projected
  circle A370 centre (65.4, -60.4) radius 2.5527 projected
  circle A371 centre (40, -60.4) radius 2.5527 projected
  circle A372 centre (14.6, -60.4) radius 2.5527 projected
  circle A373 centre (-10.8, -60.4) radius 2.5527 projected
  circle A374 centre (-36.2, -60.4) radius 2.5527 projected
  circle A375 centre (-61.6, -60.4) radius 2.5527 projected
  circle A376 centre (-87, -60.4) radius 2.5527 projected
  circle A377 centre (-112.4, -60.4) radius 2.5527 projected
  circle A378 centre (-137.8, -60.4) radius 2.5527 projected
  circle A379 centre (-163.2, -60.4) radius 2.5527 projected
  circle A380 centre (-188.6, -60.4) radius 2.5527 projected
  circle A381 centre (243.2, -35) radius 2.5527 projected
  circle A382 centre (217.8, -35) radius 2.5527 projected
  circle A383 centre (192.4, -35) radius 2.5527 projected
  circle A384 centre (167, -35) radius 2.5527 projected
  circle A385 centre (141.6, -35) radius 2.5527 projected
  circle A386 centre (116.2, -35) radius 2.5527 projected
  circle A387 centre (90.8, -35) radius 2.5527 projected
  circle A388 centre (65.4, -35) radius 2.5527 projected
  circle A389 centre (40, -35) radius 2.5527 projected
  circle A390 centre (14.6, -35) radius 2.5527 projected
  circle A391 centre (-10.8, -35) radius 2.5527 projected
  circle A392 centre (-36.2, -35) radius 2.5527 projected
  circle A393 centre (-61.6, -35) radius 2.5527 projected
  circle A394 centre (-87, -35) radius 2.5527 projected
  circle A395 centre (-112.4, -35) radius 2.5527 projected
  circle A396 centre (-137.8, -35) radius 2.5527 projected
  circle A397 centre (-163.2, -35) radius 2.5527 projected
  circle A398 centre (-188.6, -35) radius 2.5527 projected
  circle A399 centre (243.2, -9.6) radius 2.5527 projected
  circle A400 centre (217.8, -9.6) radius 2.5527 projected
  circle A401 centre (192.4, -9.6) radius 2.5527 projected
  circle A402 centre (167, -9.6) radius 2.5527 projected
  circle A403 centre (141.6, -9.6) radius 2.5527 projected
  circle A404 centre (116.2, -9.6) radius 2.5527 projected
  circle A405 centre (90.8, -9.6) radius 2.5527 projected
  circle A406 centre (65.4, -9.6) radius 2.5527 projected
  circle A407 centre (40, -9.6) radius 2.5527 projected
  circle A408 centre (14.6, -9.6) radius 2.5527 projected
  circle A409 centre (-10.8, -9.6) radius 2.5527 projected
  circle A410 centre (-36.2, -9.6) radius 2.5527 projected
  circle A411 centre (-61.6, -9.6) radius 2.5527 projected
  circle A412 centre (-87, -9.6) radius 2.5527 projected
  circle A413 centre (-112.4, -9.6) radius 2.5527 projected
  circle A414 centre (-137.8, -9.6) radius 2.5527 projected
  circle A415 centre (-163.2, -9.6) radius 2.5527 projected
  circle A416 centre (-188.6, -9.6) radius 2.5527 projected
  circle A417 centre (243.2, 15.8) radius 2.5527 projected
  circle A418 centre (217.8, 15.8) radius 2.5527 projected
  circle A419 centre (192.4, 15.8) radius 2.5527 projected
  circle A420 centre (167, 15.8) radius 2.5527 projected
  circle A421 centre (141.6, 15.8) radius 2.5527 projected
  circle A422 centre (116.2, 15.8) radius 2.5527 projected
  circle A423 centre (90.8, 15.8) radius 2.5527 projected
  circle A424 centre (65.4, 15.8) radius 2.5527 projected
  circle A425 centre (40, 15.8) radius 2.5527 projected
  circle A426 centre (14.6, 15.8) radius 2.5527 projected
  circle A427 centre (-10.8, 15.8) radius 2.5527 projected
  circle A428 centre (-36.2, 15.8) radius 2.5527 projected
  circle A429 centre (-61.6, 15.8) radius 2.5527 projected
  circle A430 centre (-87, 15.8) radius 2.5527 projected
  circle A431 centre (-112.4, 15.8) radius 2.5527 projected
  circle A432 centre (-137.8, 15.8) radius 2.5527 projected
  circle A433 centre (-163.2, 15.8) radius 2.5527 projected
  circle A434 centre (-188.6, 15.8) radius 2.5527 projected
  circle A435 centre (243.2, -568.4) radius 2.5527 projected
  point P0 (0, 0)
hole "Hole1" at (40, 15.8, 30.5168) at (40, -35, 30.5168) at (-36.2, -35, 30.5168) direction (0, 0, -1) diameter 6.35 end through all counterbore diameter 9.652 counterbore depth 6.5
sketch "Sketch3" plane through (0, 0, 30.5168) normal (0, 0, 1) x (1, 0, 0)
  line L0 (26.7983, -23.1663) -> (-8.171, -21.7006) projected
  line L1 (-8.506, -29.6936) -> (-8.171, -21.7006) projected
  line L2 (26.4633, -31.1592) -> (-8.506, -29.6936) projected
  line L3 (26.7983, -23.1663) -> (26.4633, -31.1592) projected
  circle A0 centre (9.1461, -26.4299) radius 1.75 projected
  line L4 (-5.9098, 32.252) -> (29.0595, 30.7864) projected
  line L5 (29.3946, 38.7794) -> (29.0595, 30.7864) projected
  line L6 (-5.5747, 40.245) -> (29.3946, 38.7794) projected
  line L7 (-5.9098, 32.252) -> (-5.5747, 40.245) projected
  circle A1 centre (11.7424, 35.5157) radius 1.75 projected
  point P0 (0, 0)
hole "Hole2" at (9.1461, -26.4299, 30.5168) at (11.7424, 35.5157, 30.5168) direction (0, 0, -1) diameter 2.459 depth 6 tip angle 118 thread size "M3x0.5" class "6H" standard "ANSI Metric M Profile"
sketch "Sketch4" plane through (0, 0, 0) normal (0, 0, -1) x (-1, 0, 0)
  circle A0 centre (33.5506, 15.8) radius 2.3368 projected
  point P0 (0, 0)
hole "Hole3" at (-33.5506, 15.8, 0) direction (0, 0, 1) diameter 4.1656 end through all counterbore diameter 7.112 counterbore depth 24
sketch "Sketch5" plane through (0, 0, 30.5168) normal (0, 0, 1) x (1, 0, 0)
  line L0 (-47.5, 42.5) -> (47.5, 42.5) projected
  line L1 (-47.5, -42.5) -> (-47.5, 42.5) projected
  line L2 (-38.3766, 10.7023) -> (-38.3766, 20.8977) projected
  line L3 (-38.3766, 42.5) -> (-47.5, 42.5)
  line L4 (-47.5, 42.5) -> (-47.5, 10.5)
  line L5 (-47.5, 10.5) -> (-38.3766, 10.5)
  line L6 (-38.3766, 10.5) -> (-38.3766, 42.5)
  point P0 (0, 0)
  dimension "d27" = 32
extrude "Extrusion2" add sketch "Sketch5" along normal blind 2
properties part number "baseblock for AOTF"
